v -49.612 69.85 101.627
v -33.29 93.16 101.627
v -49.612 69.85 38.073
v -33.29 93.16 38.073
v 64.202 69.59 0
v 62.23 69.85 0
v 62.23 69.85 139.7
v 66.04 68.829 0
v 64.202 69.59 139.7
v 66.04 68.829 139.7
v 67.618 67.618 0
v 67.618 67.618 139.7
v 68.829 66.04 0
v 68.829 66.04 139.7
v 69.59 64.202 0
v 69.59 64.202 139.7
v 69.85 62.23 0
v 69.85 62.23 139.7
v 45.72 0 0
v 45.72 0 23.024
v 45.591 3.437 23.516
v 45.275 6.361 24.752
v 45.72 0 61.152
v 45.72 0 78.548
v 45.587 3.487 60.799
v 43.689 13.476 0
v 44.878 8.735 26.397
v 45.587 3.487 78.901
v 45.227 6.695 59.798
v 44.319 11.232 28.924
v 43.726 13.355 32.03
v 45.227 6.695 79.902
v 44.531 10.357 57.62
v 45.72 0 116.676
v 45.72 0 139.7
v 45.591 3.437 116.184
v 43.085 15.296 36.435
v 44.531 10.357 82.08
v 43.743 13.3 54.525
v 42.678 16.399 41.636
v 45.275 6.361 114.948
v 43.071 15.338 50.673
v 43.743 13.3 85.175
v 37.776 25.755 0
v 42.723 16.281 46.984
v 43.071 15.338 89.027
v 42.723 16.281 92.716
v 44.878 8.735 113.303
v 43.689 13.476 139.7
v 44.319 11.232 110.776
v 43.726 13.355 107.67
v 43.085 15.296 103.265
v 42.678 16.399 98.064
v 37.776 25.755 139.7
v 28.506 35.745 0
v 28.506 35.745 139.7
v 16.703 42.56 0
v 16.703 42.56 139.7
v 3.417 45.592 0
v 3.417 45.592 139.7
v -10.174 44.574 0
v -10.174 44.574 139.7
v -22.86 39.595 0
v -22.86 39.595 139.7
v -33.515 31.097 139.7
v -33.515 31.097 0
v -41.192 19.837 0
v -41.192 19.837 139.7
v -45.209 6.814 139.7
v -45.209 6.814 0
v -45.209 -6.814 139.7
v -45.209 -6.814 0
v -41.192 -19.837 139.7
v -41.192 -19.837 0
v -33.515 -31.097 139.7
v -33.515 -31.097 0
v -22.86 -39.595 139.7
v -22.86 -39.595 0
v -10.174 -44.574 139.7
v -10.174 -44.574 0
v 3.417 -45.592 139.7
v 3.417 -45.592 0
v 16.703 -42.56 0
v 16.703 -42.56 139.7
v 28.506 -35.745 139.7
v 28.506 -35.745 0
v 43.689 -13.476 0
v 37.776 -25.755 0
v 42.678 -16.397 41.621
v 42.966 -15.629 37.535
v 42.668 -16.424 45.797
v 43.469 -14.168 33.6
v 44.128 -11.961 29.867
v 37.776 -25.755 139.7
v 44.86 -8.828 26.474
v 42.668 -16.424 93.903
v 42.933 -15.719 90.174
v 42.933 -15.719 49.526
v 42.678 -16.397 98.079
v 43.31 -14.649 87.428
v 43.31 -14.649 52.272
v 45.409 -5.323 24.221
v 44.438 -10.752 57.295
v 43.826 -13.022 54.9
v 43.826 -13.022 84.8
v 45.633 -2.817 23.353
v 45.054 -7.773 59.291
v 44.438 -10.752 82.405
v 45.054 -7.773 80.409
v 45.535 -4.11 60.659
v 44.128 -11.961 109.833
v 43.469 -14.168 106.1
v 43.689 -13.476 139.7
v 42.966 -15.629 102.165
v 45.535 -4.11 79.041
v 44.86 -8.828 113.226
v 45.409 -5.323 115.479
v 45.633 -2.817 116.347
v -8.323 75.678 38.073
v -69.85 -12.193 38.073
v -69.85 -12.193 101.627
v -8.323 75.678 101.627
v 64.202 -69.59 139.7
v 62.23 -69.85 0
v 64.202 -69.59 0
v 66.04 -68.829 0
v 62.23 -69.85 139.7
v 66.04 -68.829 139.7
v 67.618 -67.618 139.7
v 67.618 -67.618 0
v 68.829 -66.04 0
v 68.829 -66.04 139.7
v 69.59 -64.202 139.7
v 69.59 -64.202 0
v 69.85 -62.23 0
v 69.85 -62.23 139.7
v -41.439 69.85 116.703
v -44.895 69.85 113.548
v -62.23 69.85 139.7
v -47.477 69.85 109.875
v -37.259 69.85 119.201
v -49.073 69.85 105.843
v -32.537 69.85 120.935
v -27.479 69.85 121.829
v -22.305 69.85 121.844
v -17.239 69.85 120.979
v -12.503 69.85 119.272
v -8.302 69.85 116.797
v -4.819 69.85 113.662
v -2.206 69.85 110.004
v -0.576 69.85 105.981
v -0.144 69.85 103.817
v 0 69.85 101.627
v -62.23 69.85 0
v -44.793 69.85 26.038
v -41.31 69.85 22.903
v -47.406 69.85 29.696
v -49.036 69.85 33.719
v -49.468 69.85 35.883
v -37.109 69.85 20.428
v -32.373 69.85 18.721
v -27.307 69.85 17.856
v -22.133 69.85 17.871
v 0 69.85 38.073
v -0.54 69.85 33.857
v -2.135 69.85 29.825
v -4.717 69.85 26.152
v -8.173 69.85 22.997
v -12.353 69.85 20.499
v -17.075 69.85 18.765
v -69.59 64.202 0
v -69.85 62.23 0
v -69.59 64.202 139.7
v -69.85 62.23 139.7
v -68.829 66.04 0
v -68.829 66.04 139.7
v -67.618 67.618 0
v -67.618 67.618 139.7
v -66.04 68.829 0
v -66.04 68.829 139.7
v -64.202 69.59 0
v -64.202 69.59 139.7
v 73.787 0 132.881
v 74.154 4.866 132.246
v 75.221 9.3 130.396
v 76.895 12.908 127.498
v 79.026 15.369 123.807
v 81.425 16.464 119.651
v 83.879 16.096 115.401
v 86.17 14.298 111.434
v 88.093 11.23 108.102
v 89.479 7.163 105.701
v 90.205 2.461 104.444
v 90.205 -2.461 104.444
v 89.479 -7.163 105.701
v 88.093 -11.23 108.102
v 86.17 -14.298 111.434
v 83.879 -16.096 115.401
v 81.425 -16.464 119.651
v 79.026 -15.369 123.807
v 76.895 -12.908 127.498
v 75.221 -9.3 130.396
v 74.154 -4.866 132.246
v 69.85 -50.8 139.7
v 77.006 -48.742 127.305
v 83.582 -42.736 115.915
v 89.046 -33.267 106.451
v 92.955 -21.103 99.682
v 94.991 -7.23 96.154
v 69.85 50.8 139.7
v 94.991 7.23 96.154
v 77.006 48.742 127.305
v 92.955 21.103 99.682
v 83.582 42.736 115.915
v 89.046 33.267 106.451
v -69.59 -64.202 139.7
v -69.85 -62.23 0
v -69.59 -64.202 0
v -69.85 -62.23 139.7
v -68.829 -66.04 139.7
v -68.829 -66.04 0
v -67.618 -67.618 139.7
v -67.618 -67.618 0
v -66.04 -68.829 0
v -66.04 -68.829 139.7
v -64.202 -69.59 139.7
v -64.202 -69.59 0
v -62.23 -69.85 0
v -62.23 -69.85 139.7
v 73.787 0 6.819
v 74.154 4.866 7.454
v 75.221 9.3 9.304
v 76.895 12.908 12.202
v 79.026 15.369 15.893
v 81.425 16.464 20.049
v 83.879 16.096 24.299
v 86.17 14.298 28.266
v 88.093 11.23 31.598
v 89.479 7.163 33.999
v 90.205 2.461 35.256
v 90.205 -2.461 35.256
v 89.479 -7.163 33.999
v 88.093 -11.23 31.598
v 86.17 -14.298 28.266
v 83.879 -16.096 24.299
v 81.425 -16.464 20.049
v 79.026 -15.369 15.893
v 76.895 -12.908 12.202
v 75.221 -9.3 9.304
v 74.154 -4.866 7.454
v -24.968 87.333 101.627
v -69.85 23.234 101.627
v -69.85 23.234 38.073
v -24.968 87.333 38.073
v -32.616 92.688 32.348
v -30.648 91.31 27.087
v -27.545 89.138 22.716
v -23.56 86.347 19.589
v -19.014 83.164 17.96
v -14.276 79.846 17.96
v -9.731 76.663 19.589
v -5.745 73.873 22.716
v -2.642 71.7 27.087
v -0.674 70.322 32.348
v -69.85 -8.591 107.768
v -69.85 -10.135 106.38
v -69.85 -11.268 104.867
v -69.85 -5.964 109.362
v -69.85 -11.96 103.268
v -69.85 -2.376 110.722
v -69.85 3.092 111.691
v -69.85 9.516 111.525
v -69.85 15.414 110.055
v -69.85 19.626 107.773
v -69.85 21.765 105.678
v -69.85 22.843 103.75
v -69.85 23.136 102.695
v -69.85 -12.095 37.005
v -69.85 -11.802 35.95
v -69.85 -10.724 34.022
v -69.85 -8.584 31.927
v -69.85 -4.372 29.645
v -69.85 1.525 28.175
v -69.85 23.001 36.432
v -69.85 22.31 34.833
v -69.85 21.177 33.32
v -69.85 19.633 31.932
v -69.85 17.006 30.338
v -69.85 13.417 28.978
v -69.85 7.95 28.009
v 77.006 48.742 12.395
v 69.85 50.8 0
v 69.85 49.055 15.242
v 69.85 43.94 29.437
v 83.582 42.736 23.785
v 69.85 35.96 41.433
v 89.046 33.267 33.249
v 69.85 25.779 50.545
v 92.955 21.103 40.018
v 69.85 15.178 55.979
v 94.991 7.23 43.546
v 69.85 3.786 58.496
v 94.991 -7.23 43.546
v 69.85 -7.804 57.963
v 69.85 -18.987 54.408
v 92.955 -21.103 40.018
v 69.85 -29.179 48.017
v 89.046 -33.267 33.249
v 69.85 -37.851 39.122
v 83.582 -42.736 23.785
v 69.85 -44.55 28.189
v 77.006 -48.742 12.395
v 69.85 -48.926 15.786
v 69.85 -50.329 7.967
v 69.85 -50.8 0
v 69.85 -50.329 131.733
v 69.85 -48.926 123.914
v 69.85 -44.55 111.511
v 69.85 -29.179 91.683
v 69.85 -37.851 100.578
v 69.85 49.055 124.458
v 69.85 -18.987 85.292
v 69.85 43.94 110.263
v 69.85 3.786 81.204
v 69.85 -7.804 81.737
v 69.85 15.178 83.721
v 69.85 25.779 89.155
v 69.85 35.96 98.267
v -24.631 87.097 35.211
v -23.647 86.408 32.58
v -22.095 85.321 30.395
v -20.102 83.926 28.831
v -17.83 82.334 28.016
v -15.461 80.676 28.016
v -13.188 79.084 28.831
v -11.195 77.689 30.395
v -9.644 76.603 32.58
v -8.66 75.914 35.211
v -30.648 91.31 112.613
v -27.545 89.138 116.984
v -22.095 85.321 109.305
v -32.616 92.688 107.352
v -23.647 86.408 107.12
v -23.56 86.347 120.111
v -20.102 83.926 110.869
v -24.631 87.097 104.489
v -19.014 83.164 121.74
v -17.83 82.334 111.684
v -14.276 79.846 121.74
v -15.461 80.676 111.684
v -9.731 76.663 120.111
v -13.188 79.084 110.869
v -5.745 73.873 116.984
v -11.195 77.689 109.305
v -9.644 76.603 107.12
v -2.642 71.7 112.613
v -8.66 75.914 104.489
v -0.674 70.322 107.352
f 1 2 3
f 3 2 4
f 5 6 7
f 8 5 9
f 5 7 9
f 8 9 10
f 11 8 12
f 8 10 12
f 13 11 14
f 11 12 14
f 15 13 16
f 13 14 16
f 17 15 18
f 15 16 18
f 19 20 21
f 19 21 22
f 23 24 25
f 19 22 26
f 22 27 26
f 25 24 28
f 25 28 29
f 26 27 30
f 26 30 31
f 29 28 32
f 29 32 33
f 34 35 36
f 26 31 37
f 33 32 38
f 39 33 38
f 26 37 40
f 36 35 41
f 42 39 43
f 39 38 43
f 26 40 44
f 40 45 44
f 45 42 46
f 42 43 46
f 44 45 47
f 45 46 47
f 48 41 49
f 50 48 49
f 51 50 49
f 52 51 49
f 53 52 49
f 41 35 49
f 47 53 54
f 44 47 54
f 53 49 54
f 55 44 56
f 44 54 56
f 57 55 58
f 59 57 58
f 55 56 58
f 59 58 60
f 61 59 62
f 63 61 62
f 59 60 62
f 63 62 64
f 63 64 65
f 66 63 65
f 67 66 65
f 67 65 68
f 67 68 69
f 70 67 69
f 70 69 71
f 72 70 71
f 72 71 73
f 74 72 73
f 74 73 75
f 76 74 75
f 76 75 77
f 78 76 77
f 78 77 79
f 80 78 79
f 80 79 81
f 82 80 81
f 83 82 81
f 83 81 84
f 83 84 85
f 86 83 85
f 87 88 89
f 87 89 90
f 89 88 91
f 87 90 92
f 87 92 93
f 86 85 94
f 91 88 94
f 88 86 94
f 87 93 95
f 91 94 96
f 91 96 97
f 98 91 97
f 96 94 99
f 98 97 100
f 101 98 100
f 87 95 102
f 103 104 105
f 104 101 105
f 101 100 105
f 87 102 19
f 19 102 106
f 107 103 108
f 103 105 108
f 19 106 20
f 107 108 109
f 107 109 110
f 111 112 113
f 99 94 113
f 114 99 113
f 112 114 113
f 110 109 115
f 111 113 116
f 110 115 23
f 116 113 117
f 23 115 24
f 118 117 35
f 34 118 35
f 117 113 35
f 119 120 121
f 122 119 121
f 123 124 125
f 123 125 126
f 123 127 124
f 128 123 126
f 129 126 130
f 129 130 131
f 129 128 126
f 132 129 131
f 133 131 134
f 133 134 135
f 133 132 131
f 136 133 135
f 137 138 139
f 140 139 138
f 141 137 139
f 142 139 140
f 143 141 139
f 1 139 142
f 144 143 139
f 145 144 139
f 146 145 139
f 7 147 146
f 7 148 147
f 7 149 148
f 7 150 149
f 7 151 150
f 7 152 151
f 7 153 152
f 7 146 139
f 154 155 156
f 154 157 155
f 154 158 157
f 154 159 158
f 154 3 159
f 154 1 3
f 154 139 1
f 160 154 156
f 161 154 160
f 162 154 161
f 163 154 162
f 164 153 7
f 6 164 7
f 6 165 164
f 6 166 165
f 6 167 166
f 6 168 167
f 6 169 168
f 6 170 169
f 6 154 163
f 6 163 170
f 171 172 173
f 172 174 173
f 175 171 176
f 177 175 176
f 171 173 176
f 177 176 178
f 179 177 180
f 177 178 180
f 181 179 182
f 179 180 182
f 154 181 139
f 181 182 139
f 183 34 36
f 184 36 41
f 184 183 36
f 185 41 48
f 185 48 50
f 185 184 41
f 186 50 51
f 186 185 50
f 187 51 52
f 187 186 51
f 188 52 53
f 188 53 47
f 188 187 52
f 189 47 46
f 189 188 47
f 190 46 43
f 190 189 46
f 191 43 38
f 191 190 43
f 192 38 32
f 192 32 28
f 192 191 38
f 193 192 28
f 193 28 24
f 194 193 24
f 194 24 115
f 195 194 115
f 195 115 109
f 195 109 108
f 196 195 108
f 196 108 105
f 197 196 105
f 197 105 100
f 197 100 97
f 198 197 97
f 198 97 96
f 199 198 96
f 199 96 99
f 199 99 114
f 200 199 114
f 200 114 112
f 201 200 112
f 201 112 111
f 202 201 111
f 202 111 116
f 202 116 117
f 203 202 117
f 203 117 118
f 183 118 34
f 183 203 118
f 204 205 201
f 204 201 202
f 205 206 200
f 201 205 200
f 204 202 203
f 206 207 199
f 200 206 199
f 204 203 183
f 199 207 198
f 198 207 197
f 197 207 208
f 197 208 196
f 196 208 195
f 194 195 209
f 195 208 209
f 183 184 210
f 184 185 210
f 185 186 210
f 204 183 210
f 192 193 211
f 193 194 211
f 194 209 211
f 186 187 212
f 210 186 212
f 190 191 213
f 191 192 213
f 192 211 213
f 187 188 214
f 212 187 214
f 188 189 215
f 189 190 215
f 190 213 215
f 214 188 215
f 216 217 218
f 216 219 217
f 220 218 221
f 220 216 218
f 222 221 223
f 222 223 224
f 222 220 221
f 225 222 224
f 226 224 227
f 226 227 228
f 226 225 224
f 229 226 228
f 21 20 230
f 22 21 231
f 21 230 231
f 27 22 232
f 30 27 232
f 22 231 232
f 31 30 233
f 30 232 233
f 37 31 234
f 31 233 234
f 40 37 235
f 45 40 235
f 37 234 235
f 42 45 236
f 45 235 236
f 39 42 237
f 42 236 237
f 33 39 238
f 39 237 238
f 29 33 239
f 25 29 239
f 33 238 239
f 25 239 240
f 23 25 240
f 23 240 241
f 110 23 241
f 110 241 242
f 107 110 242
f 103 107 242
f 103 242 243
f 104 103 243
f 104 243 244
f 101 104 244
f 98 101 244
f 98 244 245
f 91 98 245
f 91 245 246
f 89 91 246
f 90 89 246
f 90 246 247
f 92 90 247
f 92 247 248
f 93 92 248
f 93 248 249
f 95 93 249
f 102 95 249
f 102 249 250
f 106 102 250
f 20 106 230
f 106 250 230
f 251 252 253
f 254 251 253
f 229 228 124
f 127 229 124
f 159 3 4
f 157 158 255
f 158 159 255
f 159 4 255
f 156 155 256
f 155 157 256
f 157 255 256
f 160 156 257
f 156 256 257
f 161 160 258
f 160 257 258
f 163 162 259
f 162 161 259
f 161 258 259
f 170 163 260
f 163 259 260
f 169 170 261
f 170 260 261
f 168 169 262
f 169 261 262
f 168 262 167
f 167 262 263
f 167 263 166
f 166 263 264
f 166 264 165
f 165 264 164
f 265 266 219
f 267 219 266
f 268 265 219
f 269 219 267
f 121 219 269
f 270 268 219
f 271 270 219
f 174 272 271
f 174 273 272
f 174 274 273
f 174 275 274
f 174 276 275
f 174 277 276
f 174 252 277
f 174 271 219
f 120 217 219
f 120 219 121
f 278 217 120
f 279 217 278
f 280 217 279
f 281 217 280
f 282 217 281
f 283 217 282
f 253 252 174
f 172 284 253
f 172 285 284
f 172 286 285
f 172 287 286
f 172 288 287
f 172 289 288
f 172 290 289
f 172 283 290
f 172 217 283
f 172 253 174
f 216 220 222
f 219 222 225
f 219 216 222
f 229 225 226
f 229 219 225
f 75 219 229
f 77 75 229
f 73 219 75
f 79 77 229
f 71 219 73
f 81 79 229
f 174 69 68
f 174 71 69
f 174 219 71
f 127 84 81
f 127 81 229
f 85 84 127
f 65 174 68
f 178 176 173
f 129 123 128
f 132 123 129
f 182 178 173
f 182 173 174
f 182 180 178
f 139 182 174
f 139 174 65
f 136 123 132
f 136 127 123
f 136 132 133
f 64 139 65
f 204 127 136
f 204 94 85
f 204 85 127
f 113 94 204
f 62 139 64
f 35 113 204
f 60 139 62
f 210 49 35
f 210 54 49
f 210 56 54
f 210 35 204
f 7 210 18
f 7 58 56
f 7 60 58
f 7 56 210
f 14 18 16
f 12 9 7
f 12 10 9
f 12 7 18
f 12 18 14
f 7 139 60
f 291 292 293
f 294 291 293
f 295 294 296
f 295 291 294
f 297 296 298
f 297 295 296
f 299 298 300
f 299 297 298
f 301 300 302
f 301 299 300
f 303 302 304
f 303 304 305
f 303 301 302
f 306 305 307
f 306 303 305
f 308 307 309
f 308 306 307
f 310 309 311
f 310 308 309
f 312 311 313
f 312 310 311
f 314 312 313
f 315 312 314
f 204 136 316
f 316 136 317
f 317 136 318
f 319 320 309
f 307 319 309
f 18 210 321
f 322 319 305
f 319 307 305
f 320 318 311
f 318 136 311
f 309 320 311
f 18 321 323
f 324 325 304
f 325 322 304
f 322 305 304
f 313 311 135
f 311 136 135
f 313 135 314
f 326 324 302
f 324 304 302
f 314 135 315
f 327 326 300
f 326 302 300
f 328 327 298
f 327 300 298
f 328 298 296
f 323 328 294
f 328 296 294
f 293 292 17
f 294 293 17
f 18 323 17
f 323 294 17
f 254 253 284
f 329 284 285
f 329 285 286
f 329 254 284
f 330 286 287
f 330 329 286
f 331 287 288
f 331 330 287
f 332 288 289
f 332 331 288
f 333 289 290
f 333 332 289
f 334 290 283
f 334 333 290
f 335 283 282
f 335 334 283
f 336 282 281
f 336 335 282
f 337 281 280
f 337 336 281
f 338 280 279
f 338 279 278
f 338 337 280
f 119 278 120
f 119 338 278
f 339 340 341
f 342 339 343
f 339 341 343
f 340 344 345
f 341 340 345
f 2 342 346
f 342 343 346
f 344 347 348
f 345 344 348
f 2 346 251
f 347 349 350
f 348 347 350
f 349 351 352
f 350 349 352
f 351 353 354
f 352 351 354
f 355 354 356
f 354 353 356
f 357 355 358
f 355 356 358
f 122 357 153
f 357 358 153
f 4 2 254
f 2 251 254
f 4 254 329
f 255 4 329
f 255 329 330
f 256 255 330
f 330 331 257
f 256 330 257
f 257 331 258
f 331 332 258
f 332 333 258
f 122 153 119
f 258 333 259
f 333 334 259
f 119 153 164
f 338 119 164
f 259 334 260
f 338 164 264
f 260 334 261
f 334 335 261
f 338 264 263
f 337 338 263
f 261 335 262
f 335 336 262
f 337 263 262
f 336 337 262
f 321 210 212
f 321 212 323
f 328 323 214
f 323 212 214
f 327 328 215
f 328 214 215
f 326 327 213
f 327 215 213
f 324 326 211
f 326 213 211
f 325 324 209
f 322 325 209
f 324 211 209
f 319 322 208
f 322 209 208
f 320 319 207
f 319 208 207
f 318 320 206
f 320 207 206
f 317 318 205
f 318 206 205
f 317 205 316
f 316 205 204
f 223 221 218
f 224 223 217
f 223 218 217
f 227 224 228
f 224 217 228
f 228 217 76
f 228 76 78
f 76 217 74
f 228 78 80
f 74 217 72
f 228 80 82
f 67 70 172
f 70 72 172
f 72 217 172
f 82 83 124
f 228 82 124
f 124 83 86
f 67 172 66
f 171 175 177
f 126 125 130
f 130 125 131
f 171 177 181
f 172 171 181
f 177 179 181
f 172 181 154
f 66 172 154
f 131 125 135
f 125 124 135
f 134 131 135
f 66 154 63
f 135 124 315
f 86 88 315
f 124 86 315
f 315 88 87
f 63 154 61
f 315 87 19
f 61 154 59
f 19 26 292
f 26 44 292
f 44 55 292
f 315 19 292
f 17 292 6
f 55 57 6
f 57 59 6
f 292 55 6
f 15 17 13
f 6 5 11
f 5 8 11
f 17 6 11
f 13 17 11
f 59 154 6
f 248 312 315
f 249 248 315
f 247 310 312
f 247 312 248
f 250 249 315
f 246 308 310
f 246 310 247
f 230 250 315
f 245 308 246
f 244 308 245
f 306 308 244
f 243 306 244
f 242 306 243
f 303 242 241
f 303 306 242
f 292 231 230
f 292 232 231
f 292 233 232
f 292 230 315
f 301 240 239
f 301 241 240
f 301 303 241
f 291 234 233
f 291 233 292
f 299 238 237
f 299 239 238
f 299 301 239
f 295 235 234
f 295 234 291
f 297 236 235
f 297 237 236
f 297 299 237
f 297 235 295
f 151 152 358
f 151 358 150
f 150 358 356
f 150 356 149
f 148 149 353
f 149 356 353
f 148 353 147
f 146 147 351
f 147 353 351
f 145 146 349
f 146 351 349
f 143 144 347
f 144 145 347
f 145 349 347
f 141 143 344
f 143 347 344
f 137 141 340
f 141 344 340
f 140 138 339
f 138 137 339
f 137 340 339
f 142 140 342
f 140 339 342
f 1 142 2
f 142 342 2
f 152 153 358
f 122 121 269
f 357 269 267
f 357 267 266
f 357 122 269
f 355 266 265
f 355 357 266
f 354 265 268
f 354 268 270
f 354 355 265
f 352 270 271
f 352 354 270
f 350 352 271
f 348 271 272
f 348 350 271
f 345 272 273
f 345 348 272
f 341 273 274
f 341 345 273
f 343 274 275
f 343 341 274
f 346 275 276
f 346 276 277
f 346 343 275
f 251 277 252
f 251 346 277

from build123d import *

# Parameters (mm, degrees)
SKETCH1_W               = 139.7
SKETCH1_H               = 139.7
BOSS_EXTRUDE1_DEPTH     = 139.7
FILLET1_R               = 7.62
FILLET2_R               = 7.62
BOSS_EXTRUDE3_REACH     = 210.999
CUT_EXTRUDE2_DEPTH      = 209.804
SKETCH9_R               = 45.72
CUT_EXTRUDE3_DEPTH      = 209.804
BOSS_EXTRUDE4_REACH     = 231.134
CUT_EXTRUDE4_REACH      = 231.134
CUT_EXTRUDE4_END_RADIUS = 45.72
SKETCH11_R              = 16.51


with BuildPart() as part:
    # Sketch1 → Boss-Extrude1 (new body)
    with BuildSketch(Plane.XY):
        Rectangle(SKETCH1_W, SKETCH1_H)
    extrude(amount=BOSS_EXTRUDE1_DEPTH)

    # Fillet1
    fillet1_edges = [part.edges().sort_by_distance(p)[0] for p in [
        (-69.85, 69.85, 69.85),
    ]]
    fillet(fillet1_edges, radius=FILLET1_R)

    # Fillet2
    fillet2_edges = [part.edges().sort_by_distance(p)[0] for p in [
        (69.85, -69.85, 69.85),
        (-69.85, -69.85, 69.85),
        (69.85, 69.85, 69.85),
    ]]
    fillet(fillet2_edges, radius=FILLET2_R)

    # Sketch6 → Boss-Extrude3 (add, up to next)
    with BuildSketch(Plane(origin=(32.818764781, 46.870053506, 0), x_dir=(0, 0, 1), z_dir=(0.5735764363510473, 0.819152044288991, 0)), mode=Mode.PRIVATE) as boss_extrude3_sk1:
        with BuildLine():
            Line((38.072922524, -40.064314079), (101.627077476, -40.064314079))
            ThreePointArc((101.627077476, -40.064314079), (121.947077476, -60.384314079), (101.627077476, -80.704314079))
            Line((101.627077476, -80.704314079), (38.072922524, -80.704314079))
            ThreePointArc((38.072922524, -80.704314079), (17.752922524, -60.384314079), (38.072922524, -40.064314079))
        make_face()
    boss_extrude3_tool1 = extrude(boss_extrude3_sk1.sketch, amount=-BOSS_EXTRUDE3_REACH, mode=Mode.PRIVATE) - part.part
    add(boss_extrude3_tool1.solids().sort_by_distance((-16.64517, 81.505073, 69.85))[0])

    # Sketch8 → Cut-Extrude2 (cut)
    with BuildSketch(Plane(origin=(32.818764781, 46.870053506, 0), x_dir=(0.819152044288991, -0.5735764363510474, 0), z_dir=(0.5735764363510474, 0.819152044288991, 0))):
        with BuildLine():
            Line((-70.544314079, -101.627077476), (-70.544314079, -38.072922524))
            ThreePointArc((-70.544314079, -38.072922524), (-60.384314079, -27.912922524), (-50.224314079, -38.072922524))
            Line((-50.224314079, -38.072922524), (-50.224314079, -101.627077476))
            ThreePointArc((-50.224314079, -101.627077476), (-60.384314079, -111.787077476), (-70.544314079, -101.627077476))
        make_face()
    extrude(amount=-CUT_EXTRUDE2_DEPTH, mode=Mode.SUBTRACT)

    # Sketch9 → Cut-Extrude3 (cut)
    with BuildSketch(Plane.XY.offset(139.7)):
        Circle(SKETCH9_R)
    extrude(amount=-CUT_EXTRUDE3_DEPTH, mode=Mode.SUBTRACT)

    # Boss-Extrude4: up to this face of the body (flat: up to its plane)
    boss_extrude4_end = Plane(part.part.faces().sort_by_distance((69.85, 0, 69.85))[0])
    # Sketch10 → Boss-Extrude4 (add, up to the picked face)
    with BuildSketch(Plane(origin=(52.3875, 0, -30.245937227), x_dir=(0, 1, 0), z_dir=(0.866025403784438, 0, -0.5000000000000009)), mode=Mode.PRIVATE) as boss_extrude4_sk1:
        with BuildLine():
            Line((-50.8, 34.925), (50.8, 34.925))
            ThreePointArc((50.8, 34.925), (0, 85.725), (-50.8, 34.925))
        make_face()
    boss_extrude4_tool1 = split(extrude(boss_extrude4_sk1.sketch, amount=-BOSS_EXTRUDE4_REACH, mode=Mode.PRIVATE), bisect_by=boss_extrude4_end, keep=Keep.BOTH, mode=Mode.PRIVATE)
    boss_extrude4 = boss_extrude4_tool1.solids().sort_by(Axis((80.630095, 0, 18.671672), (-0.866025403784438, 0, 0.5000000000000009)))[0]
    add(boss_extrude4)

    # Cut-Extrude4: up to this cylinder (the profile starts outside it)
    cut_extrude4_end = Plane(origin=(0, 0, 21.117163), z_dir=(0, 0, 1)) * Cylinder(CUT_EXTRUDE4_END_RADIUS, 554.708, mode=Mode.PRIVATE)
    # Sketch11 → Cut-Extrude4 (cut, up to the surface)
    with BuildSketch(Plane(origin=(52.3875, 0, -30.245937227), x_dir=(-0.5000000000000012, 0, -0.866025403784438), z_dir=(0.8660254037844379, 0, -0.5000000000000011)), mode=Mode.PRIVATE) as cut_extrude4_sk1:
        with Locations((-59.309, 0)):
            Circle(SKETCH11_R)
    cut_extrude4_tool1 = extrude(cut_extrude4_sk1.sketch, amount=-CUT_EXTRUDE4_REACH, mode=Mode.PRIVATE) - cut_extrude4_end
    cut_extrude4 = cut_extrude4_tool1.solids().sort_by_distance((82.042, 0, 21.117163))[0]
    add(cut_extrude4, mode=Mode.SUBTRACT)

    # Mirror1: Boss-Extrude4, Cut-Extrude4 across plane
    add(boss_extrude4.mirror(Plane.XY.offset(69.85)))
    add(cut_extrude4.mirror(Plane.XY.offset(69.85)), mode=Mode.SUBTRACT)


solid = part.part
